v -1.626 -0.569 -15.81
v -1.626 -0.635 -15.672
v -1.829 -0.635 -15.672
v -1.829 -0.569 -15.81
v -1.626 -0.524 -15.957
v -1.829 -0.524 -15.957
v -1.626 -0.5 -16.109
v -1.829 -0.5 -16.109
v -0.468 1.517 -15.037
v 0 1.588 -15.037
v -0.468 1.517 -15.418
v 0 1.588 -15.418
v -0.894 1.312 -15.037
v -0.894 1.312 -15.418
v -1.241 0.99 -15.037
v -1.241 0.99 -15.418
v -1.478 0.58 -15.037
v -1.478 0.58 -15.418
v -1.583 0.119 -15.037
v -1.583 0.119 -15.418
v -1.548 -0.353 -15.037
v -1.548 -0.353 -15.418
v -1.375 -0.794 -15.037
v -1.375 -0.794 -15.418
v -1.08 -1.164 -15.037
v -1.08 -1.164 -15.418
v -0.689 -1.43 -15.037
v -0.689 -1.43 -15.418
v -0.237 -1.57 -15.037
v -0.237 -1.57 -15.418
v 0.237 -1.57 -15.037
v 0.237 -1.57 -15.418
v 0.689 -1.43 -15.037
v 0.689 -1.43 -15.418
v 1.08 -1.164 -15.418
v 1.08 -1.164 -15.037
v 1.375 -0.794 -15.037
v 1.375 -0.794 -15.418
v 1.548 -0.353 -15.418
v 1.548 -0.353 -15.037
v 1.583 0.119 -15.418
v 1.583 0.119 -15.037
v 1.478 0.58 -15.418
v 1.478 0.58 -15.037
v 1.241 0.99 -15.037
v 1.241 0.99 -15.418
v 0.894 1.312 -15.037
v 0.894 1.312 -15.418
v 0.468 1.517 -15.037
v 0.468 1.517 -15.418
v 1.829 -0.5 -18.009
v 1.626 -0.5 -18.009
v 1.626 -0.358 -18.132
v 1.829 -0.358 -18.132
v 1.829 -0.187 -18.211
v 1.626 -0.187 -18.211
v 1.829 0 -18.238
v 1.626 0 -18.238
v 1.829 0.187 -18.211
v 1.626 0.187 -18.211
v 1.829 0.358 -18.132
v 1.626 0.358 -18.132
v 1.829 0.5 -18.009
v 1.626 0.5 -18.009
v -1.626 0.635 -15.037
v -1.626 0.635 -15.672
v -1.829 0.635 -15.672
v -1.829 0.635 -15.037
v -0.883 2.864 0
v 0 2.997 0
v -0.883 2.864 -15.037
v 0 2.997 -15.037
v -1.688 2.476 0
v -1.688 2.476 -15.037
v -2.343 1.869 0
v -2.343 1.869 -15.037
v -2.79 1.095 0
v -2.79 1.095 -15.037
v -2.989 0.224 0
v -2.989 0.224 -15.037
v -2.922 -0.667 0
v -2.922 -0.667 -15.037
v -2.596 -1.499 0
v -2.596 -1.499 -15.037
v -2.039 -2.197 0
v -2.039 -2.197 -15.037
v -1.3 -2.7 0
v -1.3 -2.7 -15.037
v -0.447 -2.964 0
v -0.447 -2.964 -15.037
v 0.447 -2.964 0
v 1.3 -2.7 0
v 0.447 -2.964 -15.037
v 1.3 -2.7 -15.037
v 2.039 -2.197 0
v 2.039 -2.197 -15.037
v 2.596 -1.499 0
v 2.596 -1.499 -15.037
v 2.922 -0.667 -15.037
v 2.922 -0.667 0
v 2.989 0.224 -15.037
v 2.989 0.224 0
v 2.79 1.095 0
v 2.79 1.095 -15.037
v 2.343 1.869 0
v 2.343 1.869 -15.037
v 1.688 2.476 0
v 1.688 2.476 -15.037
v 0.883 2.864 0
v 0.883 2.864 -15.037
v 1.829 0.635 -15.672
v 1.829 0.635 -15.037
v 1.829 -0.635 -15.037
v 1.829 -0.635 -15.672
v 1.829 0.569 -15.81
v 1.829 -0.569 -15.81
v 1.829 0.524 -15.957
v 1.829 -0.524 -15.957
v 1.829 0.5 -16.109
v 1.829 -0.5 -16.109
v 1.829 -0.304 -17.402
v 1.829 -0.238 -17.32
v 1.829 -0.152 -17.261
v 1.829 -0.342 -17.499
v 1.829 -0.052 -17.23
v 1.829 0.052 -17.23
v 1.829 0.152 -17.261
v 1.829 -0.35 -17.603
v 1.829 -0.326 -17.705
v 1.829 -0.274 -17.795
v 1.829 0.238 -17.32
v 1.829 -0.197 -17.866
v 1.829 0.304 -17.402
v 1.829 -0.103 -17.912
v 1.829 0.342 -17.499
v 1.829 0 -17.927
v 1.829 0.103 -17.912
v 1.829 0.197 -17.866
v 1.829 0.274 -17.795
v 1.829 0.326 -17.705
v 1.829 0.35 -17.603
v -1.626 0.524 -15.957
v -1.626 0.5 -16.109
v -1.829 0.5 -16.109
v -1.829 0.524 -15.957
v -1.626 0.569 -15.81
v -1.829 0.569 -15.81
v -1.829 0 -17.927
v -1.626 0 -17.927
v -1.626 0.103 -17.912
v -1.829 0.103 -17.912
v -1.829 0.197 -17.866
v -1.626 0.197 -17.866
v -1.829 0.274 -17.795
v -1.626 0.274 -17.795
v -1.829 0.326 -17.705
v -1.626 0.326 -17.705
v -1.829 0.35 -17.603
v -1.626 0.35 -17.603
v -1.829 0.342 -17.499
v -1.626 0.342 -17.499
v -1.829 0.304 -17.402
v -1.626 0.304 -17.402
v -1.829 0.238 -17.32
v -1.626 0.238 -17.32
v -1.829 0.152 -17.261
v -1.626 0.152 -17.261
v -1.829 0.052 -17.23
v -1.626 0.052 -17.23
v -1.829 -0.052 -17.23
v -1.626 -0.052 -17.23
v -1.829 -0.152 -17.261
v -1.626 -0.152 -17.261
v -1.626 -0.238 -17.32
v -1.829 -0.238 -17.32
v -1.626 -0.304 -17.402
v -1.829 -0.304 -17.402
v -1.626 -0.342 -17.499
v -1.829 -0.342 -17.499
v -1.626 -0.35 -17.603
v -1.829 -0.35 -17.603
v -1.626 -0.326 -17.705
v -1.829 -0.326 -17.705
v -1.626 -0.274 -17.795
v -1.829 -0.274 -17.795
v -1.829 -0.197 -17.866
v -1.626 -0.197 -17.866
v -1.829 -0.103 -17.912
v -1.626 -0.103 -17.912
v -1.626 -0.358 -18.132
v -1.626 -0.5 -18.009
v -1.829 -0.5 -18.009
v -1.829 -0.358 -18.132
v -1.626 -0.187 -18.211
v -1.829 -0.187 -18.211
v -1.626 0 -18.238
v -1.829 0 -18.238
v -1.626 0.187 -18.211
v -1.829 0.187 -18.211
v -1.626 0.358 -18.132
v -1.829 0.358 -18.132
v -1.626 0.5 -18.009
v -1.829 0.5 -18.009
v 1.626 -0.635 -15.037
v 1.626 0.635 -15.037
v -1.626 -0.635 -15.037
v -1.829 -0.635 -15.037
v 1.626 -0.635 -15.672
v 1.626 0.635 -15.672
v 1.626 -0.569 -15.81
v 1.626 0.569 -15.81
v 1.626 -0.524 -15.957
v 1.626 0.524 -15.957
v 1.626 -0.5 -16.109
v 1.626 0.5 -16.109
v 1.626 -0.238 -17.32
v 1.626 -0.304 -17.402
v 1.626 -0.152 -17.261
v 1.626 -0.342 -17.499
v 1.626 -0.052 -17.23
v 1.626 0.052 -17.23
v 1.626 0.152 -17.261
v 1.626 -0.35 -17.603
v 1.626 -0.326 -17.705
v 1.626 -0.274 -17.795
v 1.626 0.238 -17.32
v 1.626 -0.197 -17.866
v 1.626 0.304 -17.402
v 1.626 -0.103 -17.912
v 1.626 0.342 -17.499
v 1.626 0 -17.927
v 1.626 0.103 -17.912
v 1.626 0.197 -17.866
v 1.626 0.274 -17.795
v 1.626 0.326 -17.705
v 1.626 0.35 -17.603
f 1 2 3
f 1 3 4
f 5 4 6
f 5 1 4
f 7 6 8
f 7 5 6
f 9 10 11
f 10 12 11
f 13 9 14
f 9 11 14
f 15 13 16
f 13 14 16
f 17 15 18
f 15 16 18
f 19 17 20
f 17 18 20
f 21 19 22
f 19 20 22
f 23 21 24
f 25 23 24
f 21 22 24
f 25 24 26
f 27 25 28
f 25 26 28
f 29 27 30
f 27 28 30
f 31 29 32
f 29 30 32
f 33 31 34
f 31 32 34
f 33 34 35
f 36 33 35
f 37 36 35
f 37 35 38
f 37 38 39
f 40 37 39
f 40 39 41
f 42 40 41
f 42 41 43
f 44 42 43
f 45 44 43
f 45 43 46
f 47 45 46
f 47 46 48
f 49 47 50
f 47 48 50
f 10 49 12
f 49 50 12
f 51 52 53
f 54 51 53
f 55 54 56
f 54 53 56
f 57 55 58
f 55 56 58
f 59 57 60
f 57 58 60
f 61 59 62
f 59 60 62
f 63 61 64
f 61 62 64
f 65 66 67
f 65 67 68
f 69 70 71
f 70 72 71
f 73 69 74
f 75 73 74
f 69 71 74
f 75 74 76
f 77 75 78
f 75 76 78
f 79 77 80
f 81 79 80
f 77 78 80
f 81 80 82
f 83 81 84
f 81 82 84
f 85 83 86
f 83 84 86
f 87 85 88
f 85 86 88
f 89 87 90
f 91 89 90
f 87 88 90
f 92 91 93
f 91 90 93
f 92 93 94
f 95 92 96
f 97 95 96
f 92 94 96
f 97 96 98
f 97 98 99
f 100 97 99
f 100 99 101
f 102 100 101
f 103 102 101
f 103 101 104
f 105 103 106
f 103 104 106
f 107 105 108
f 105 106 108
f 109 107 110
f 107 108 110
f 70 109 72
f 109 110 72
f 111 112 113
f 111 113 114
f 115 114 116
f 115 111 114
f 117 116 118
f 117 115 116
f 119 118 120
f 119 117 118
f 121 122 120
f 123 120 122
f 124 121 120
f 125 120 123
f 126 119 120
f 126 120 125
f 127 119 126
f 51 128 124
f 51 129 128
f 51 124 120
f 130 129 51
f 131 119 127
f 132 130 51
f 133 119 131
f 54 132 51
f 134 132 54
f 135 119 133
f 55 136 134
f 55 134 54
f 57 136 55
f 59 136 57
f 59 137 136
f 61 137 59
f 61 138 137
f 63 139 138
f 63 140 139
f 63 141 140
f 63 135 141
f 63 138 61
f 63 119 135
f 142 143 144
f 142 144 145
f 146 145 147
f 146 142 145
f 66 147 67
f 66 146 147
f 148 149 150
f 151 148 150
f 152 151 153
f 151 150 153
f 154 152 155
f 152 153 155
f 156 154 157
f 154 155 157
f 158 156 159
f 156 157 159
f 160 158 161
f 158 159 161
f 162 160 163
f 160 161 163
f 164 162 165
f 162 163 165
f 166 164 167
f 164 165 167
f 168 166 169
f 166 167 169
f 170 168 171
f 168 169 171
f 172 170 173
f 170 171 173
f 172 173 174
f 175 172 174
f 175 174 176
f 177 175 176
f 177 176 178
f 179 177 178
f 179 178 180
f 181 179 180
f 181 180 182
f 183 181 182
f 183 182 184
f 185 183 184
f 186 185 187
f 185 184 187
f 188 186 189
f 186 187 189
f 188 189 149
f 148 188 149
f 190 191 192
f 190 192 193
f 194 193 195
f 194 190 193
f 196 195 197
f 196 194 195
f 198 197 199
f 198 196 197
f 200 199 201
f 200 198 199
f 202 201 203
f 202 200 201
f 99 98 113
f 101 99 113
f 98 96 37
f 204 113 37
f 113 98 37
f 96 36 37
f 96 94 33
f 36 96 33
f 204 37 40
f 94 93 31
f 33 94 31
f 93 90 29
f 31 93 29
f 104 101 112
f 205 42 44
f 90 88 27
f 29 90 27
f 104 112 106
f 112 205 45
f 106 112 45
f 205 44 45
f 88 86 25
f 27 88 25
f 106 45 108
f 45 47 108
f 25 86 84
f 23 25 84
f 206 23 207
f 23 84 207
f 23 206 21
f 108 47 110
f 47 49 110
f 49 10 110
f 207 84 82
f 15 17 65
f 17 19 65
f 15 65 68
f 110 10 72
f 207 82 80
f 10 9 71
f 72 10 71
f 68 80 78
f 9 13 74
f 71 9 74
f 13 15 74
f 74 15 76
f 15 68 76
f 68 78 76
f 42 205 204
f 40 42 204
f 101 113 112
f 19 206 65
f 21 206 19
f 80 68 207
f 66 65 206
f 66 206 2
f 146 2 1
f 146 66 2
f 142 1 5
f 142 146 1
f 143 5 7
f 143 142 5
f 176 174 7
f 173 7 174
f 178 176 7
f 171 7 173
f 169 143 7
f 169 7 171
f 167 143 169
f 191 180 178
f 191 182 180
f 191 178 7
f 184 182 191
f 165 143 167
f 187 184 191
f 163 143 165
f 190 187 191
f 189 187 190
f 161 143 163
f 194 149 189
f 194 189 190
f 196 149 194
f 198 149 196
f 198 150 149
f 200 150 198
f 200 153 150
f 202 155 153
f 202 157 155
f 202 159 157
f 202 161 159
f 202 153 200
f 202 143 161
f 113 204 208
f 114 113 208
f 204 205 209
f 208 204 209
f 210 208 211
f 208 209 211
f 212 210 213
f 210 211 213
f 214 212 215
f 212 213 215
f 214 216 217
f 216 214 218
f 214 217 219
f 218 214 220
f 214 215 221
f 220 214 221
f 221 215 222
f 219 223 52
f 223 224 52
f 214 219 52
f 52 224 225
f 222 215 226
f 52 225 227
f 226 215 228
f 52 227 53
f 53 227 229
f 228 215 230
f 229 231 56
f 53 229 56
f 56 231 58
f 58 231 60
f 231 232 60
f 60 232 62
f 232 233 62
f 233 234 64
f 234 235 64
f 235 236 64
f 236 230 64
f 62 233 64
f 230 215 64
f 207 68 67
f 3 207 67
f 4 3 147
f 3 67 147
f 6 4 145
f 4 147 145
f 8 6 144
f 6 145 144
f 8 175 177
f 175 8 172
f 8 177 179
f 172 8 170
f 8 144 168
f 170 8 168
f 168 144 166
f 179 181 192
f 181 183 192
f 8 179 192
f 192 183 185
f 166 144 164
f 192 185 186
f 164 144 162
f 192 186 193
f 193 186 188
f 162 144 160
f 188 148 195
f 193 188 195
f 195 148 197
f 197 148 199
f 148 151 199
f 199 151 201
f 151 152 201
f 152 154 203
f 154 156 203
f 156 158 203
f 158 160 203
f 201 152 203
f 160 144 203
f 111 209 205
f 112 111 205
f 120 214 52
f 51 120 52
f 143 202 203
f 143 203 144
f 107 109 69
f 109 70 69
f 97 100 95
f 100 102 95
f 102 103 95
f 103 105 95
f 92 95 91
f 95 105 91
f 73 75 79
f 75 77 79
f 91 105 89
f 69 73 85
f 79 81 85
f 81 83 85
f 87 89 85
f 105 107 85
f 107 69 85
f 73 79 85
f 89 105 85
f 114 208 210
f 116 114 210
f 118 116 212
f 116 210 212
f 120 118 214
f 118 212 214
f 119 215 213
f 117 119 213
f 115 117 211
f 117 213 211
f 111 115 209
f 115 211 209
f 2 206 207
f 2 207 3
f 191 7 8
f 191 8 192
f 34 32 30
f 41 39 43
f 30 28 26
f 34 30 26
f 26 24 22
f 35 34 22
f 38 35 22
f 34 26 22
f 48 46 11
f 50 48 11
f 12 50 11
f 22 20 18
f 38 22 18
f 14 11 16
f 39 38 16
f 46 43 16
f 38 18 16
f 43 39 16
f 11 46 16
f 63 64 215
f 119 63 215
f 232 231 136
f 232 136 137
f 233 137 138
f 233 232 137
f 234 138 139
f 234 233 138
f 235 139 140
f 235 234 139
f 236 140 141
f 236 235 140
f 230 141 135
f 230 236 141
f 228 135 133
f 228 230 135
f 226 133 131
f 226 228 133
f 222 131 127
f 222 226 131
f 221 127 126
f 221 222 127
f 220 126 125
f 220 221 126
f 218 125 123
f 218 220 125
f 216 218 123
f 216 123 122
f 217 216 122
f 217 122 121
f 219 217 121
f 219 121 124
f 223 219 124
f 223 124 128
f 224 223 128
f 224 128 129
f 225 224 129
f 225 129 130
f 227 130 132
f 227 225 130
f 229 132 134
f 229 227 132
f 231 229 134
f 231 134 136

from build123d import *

# Parameters (mm, degrees)
SKETCH3_R           = 0.35052
BOSS_EXTRUDE1_DEPTH = 0.2032


with BuildPart() as part:
    # Sketch1 → Revolve1 (revolve)
    with BuildSketch(Plane(origin=(0, 0, 0), x_dir=(0, 0, -1), z_dir=(1, 0, 0))):
        Polygon((0, 0), (0, 2.9972), (15.0368, 2.9972), (15.0368, 1.5875), (15.4178, 1.5875), (15.4178, 0), align=None)
    revolve(axis=Axis((0, 0, -15.4178), (0, 0, 1)))

    # Sketch3 → Boss-Extrude1 (add)
    with BuildSketch(Plane(origin=(1.6256, 0, 0), x_dir=(0, 0, -1), z_dir=(1, 0, 0))):
        with BuildLine():
            Line((15.0368, 0.635), (15.0368, -0.635))
            Line((15.0368, -0.635), (15.6718, -0.635))
            ThreePointArc((15.6718, -0.635), (15.882828569, -0.543684888), (16.108651936, -0.50038))
            Line((16.108651936, -0.50038), (18.0086, -0.50038))
            ThreePointArc((18.0086, -0.50038), (18.237732209, 0), (18.0086, 0.50038))
            Line((18.0086, 0.50038), (16.108651936, 0.50038))
            ThreePointArc((16.108651936, 0.50038), (15.882828569, 0.543684888), (15.6718, 0.635))
            Line((15.6718, 0.635), (15.0368, 0.635))
        make_face()
        with Locations((17.5768, 0)):
            Circle(SKETCH3_R, mode=Mode.SUBTRACT)
    boss_extrude1 = extrude(amount=BOSS_EXTRUDE1_DEPTH)

    # Mirror1: Boss-Extrude1 across plane
    add(boss_extrude1.mirror(Plane(origin=(0, 0, 0), x_dir=(0, 0, 1), z_dir=(1, 0, 0))))


solid = part.part
